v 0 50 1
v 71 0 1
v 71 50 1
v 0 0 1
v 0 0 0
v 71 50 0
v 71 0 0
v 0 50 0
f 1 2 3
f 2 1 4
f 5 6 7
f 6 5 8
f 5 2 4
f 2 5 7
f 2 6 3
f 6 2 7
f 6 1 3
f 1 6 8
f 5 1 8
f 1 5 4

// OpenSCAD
module mirror() {
    color([0, 0, 1])
    cube([71, 50, 1]);
}
mirror();
